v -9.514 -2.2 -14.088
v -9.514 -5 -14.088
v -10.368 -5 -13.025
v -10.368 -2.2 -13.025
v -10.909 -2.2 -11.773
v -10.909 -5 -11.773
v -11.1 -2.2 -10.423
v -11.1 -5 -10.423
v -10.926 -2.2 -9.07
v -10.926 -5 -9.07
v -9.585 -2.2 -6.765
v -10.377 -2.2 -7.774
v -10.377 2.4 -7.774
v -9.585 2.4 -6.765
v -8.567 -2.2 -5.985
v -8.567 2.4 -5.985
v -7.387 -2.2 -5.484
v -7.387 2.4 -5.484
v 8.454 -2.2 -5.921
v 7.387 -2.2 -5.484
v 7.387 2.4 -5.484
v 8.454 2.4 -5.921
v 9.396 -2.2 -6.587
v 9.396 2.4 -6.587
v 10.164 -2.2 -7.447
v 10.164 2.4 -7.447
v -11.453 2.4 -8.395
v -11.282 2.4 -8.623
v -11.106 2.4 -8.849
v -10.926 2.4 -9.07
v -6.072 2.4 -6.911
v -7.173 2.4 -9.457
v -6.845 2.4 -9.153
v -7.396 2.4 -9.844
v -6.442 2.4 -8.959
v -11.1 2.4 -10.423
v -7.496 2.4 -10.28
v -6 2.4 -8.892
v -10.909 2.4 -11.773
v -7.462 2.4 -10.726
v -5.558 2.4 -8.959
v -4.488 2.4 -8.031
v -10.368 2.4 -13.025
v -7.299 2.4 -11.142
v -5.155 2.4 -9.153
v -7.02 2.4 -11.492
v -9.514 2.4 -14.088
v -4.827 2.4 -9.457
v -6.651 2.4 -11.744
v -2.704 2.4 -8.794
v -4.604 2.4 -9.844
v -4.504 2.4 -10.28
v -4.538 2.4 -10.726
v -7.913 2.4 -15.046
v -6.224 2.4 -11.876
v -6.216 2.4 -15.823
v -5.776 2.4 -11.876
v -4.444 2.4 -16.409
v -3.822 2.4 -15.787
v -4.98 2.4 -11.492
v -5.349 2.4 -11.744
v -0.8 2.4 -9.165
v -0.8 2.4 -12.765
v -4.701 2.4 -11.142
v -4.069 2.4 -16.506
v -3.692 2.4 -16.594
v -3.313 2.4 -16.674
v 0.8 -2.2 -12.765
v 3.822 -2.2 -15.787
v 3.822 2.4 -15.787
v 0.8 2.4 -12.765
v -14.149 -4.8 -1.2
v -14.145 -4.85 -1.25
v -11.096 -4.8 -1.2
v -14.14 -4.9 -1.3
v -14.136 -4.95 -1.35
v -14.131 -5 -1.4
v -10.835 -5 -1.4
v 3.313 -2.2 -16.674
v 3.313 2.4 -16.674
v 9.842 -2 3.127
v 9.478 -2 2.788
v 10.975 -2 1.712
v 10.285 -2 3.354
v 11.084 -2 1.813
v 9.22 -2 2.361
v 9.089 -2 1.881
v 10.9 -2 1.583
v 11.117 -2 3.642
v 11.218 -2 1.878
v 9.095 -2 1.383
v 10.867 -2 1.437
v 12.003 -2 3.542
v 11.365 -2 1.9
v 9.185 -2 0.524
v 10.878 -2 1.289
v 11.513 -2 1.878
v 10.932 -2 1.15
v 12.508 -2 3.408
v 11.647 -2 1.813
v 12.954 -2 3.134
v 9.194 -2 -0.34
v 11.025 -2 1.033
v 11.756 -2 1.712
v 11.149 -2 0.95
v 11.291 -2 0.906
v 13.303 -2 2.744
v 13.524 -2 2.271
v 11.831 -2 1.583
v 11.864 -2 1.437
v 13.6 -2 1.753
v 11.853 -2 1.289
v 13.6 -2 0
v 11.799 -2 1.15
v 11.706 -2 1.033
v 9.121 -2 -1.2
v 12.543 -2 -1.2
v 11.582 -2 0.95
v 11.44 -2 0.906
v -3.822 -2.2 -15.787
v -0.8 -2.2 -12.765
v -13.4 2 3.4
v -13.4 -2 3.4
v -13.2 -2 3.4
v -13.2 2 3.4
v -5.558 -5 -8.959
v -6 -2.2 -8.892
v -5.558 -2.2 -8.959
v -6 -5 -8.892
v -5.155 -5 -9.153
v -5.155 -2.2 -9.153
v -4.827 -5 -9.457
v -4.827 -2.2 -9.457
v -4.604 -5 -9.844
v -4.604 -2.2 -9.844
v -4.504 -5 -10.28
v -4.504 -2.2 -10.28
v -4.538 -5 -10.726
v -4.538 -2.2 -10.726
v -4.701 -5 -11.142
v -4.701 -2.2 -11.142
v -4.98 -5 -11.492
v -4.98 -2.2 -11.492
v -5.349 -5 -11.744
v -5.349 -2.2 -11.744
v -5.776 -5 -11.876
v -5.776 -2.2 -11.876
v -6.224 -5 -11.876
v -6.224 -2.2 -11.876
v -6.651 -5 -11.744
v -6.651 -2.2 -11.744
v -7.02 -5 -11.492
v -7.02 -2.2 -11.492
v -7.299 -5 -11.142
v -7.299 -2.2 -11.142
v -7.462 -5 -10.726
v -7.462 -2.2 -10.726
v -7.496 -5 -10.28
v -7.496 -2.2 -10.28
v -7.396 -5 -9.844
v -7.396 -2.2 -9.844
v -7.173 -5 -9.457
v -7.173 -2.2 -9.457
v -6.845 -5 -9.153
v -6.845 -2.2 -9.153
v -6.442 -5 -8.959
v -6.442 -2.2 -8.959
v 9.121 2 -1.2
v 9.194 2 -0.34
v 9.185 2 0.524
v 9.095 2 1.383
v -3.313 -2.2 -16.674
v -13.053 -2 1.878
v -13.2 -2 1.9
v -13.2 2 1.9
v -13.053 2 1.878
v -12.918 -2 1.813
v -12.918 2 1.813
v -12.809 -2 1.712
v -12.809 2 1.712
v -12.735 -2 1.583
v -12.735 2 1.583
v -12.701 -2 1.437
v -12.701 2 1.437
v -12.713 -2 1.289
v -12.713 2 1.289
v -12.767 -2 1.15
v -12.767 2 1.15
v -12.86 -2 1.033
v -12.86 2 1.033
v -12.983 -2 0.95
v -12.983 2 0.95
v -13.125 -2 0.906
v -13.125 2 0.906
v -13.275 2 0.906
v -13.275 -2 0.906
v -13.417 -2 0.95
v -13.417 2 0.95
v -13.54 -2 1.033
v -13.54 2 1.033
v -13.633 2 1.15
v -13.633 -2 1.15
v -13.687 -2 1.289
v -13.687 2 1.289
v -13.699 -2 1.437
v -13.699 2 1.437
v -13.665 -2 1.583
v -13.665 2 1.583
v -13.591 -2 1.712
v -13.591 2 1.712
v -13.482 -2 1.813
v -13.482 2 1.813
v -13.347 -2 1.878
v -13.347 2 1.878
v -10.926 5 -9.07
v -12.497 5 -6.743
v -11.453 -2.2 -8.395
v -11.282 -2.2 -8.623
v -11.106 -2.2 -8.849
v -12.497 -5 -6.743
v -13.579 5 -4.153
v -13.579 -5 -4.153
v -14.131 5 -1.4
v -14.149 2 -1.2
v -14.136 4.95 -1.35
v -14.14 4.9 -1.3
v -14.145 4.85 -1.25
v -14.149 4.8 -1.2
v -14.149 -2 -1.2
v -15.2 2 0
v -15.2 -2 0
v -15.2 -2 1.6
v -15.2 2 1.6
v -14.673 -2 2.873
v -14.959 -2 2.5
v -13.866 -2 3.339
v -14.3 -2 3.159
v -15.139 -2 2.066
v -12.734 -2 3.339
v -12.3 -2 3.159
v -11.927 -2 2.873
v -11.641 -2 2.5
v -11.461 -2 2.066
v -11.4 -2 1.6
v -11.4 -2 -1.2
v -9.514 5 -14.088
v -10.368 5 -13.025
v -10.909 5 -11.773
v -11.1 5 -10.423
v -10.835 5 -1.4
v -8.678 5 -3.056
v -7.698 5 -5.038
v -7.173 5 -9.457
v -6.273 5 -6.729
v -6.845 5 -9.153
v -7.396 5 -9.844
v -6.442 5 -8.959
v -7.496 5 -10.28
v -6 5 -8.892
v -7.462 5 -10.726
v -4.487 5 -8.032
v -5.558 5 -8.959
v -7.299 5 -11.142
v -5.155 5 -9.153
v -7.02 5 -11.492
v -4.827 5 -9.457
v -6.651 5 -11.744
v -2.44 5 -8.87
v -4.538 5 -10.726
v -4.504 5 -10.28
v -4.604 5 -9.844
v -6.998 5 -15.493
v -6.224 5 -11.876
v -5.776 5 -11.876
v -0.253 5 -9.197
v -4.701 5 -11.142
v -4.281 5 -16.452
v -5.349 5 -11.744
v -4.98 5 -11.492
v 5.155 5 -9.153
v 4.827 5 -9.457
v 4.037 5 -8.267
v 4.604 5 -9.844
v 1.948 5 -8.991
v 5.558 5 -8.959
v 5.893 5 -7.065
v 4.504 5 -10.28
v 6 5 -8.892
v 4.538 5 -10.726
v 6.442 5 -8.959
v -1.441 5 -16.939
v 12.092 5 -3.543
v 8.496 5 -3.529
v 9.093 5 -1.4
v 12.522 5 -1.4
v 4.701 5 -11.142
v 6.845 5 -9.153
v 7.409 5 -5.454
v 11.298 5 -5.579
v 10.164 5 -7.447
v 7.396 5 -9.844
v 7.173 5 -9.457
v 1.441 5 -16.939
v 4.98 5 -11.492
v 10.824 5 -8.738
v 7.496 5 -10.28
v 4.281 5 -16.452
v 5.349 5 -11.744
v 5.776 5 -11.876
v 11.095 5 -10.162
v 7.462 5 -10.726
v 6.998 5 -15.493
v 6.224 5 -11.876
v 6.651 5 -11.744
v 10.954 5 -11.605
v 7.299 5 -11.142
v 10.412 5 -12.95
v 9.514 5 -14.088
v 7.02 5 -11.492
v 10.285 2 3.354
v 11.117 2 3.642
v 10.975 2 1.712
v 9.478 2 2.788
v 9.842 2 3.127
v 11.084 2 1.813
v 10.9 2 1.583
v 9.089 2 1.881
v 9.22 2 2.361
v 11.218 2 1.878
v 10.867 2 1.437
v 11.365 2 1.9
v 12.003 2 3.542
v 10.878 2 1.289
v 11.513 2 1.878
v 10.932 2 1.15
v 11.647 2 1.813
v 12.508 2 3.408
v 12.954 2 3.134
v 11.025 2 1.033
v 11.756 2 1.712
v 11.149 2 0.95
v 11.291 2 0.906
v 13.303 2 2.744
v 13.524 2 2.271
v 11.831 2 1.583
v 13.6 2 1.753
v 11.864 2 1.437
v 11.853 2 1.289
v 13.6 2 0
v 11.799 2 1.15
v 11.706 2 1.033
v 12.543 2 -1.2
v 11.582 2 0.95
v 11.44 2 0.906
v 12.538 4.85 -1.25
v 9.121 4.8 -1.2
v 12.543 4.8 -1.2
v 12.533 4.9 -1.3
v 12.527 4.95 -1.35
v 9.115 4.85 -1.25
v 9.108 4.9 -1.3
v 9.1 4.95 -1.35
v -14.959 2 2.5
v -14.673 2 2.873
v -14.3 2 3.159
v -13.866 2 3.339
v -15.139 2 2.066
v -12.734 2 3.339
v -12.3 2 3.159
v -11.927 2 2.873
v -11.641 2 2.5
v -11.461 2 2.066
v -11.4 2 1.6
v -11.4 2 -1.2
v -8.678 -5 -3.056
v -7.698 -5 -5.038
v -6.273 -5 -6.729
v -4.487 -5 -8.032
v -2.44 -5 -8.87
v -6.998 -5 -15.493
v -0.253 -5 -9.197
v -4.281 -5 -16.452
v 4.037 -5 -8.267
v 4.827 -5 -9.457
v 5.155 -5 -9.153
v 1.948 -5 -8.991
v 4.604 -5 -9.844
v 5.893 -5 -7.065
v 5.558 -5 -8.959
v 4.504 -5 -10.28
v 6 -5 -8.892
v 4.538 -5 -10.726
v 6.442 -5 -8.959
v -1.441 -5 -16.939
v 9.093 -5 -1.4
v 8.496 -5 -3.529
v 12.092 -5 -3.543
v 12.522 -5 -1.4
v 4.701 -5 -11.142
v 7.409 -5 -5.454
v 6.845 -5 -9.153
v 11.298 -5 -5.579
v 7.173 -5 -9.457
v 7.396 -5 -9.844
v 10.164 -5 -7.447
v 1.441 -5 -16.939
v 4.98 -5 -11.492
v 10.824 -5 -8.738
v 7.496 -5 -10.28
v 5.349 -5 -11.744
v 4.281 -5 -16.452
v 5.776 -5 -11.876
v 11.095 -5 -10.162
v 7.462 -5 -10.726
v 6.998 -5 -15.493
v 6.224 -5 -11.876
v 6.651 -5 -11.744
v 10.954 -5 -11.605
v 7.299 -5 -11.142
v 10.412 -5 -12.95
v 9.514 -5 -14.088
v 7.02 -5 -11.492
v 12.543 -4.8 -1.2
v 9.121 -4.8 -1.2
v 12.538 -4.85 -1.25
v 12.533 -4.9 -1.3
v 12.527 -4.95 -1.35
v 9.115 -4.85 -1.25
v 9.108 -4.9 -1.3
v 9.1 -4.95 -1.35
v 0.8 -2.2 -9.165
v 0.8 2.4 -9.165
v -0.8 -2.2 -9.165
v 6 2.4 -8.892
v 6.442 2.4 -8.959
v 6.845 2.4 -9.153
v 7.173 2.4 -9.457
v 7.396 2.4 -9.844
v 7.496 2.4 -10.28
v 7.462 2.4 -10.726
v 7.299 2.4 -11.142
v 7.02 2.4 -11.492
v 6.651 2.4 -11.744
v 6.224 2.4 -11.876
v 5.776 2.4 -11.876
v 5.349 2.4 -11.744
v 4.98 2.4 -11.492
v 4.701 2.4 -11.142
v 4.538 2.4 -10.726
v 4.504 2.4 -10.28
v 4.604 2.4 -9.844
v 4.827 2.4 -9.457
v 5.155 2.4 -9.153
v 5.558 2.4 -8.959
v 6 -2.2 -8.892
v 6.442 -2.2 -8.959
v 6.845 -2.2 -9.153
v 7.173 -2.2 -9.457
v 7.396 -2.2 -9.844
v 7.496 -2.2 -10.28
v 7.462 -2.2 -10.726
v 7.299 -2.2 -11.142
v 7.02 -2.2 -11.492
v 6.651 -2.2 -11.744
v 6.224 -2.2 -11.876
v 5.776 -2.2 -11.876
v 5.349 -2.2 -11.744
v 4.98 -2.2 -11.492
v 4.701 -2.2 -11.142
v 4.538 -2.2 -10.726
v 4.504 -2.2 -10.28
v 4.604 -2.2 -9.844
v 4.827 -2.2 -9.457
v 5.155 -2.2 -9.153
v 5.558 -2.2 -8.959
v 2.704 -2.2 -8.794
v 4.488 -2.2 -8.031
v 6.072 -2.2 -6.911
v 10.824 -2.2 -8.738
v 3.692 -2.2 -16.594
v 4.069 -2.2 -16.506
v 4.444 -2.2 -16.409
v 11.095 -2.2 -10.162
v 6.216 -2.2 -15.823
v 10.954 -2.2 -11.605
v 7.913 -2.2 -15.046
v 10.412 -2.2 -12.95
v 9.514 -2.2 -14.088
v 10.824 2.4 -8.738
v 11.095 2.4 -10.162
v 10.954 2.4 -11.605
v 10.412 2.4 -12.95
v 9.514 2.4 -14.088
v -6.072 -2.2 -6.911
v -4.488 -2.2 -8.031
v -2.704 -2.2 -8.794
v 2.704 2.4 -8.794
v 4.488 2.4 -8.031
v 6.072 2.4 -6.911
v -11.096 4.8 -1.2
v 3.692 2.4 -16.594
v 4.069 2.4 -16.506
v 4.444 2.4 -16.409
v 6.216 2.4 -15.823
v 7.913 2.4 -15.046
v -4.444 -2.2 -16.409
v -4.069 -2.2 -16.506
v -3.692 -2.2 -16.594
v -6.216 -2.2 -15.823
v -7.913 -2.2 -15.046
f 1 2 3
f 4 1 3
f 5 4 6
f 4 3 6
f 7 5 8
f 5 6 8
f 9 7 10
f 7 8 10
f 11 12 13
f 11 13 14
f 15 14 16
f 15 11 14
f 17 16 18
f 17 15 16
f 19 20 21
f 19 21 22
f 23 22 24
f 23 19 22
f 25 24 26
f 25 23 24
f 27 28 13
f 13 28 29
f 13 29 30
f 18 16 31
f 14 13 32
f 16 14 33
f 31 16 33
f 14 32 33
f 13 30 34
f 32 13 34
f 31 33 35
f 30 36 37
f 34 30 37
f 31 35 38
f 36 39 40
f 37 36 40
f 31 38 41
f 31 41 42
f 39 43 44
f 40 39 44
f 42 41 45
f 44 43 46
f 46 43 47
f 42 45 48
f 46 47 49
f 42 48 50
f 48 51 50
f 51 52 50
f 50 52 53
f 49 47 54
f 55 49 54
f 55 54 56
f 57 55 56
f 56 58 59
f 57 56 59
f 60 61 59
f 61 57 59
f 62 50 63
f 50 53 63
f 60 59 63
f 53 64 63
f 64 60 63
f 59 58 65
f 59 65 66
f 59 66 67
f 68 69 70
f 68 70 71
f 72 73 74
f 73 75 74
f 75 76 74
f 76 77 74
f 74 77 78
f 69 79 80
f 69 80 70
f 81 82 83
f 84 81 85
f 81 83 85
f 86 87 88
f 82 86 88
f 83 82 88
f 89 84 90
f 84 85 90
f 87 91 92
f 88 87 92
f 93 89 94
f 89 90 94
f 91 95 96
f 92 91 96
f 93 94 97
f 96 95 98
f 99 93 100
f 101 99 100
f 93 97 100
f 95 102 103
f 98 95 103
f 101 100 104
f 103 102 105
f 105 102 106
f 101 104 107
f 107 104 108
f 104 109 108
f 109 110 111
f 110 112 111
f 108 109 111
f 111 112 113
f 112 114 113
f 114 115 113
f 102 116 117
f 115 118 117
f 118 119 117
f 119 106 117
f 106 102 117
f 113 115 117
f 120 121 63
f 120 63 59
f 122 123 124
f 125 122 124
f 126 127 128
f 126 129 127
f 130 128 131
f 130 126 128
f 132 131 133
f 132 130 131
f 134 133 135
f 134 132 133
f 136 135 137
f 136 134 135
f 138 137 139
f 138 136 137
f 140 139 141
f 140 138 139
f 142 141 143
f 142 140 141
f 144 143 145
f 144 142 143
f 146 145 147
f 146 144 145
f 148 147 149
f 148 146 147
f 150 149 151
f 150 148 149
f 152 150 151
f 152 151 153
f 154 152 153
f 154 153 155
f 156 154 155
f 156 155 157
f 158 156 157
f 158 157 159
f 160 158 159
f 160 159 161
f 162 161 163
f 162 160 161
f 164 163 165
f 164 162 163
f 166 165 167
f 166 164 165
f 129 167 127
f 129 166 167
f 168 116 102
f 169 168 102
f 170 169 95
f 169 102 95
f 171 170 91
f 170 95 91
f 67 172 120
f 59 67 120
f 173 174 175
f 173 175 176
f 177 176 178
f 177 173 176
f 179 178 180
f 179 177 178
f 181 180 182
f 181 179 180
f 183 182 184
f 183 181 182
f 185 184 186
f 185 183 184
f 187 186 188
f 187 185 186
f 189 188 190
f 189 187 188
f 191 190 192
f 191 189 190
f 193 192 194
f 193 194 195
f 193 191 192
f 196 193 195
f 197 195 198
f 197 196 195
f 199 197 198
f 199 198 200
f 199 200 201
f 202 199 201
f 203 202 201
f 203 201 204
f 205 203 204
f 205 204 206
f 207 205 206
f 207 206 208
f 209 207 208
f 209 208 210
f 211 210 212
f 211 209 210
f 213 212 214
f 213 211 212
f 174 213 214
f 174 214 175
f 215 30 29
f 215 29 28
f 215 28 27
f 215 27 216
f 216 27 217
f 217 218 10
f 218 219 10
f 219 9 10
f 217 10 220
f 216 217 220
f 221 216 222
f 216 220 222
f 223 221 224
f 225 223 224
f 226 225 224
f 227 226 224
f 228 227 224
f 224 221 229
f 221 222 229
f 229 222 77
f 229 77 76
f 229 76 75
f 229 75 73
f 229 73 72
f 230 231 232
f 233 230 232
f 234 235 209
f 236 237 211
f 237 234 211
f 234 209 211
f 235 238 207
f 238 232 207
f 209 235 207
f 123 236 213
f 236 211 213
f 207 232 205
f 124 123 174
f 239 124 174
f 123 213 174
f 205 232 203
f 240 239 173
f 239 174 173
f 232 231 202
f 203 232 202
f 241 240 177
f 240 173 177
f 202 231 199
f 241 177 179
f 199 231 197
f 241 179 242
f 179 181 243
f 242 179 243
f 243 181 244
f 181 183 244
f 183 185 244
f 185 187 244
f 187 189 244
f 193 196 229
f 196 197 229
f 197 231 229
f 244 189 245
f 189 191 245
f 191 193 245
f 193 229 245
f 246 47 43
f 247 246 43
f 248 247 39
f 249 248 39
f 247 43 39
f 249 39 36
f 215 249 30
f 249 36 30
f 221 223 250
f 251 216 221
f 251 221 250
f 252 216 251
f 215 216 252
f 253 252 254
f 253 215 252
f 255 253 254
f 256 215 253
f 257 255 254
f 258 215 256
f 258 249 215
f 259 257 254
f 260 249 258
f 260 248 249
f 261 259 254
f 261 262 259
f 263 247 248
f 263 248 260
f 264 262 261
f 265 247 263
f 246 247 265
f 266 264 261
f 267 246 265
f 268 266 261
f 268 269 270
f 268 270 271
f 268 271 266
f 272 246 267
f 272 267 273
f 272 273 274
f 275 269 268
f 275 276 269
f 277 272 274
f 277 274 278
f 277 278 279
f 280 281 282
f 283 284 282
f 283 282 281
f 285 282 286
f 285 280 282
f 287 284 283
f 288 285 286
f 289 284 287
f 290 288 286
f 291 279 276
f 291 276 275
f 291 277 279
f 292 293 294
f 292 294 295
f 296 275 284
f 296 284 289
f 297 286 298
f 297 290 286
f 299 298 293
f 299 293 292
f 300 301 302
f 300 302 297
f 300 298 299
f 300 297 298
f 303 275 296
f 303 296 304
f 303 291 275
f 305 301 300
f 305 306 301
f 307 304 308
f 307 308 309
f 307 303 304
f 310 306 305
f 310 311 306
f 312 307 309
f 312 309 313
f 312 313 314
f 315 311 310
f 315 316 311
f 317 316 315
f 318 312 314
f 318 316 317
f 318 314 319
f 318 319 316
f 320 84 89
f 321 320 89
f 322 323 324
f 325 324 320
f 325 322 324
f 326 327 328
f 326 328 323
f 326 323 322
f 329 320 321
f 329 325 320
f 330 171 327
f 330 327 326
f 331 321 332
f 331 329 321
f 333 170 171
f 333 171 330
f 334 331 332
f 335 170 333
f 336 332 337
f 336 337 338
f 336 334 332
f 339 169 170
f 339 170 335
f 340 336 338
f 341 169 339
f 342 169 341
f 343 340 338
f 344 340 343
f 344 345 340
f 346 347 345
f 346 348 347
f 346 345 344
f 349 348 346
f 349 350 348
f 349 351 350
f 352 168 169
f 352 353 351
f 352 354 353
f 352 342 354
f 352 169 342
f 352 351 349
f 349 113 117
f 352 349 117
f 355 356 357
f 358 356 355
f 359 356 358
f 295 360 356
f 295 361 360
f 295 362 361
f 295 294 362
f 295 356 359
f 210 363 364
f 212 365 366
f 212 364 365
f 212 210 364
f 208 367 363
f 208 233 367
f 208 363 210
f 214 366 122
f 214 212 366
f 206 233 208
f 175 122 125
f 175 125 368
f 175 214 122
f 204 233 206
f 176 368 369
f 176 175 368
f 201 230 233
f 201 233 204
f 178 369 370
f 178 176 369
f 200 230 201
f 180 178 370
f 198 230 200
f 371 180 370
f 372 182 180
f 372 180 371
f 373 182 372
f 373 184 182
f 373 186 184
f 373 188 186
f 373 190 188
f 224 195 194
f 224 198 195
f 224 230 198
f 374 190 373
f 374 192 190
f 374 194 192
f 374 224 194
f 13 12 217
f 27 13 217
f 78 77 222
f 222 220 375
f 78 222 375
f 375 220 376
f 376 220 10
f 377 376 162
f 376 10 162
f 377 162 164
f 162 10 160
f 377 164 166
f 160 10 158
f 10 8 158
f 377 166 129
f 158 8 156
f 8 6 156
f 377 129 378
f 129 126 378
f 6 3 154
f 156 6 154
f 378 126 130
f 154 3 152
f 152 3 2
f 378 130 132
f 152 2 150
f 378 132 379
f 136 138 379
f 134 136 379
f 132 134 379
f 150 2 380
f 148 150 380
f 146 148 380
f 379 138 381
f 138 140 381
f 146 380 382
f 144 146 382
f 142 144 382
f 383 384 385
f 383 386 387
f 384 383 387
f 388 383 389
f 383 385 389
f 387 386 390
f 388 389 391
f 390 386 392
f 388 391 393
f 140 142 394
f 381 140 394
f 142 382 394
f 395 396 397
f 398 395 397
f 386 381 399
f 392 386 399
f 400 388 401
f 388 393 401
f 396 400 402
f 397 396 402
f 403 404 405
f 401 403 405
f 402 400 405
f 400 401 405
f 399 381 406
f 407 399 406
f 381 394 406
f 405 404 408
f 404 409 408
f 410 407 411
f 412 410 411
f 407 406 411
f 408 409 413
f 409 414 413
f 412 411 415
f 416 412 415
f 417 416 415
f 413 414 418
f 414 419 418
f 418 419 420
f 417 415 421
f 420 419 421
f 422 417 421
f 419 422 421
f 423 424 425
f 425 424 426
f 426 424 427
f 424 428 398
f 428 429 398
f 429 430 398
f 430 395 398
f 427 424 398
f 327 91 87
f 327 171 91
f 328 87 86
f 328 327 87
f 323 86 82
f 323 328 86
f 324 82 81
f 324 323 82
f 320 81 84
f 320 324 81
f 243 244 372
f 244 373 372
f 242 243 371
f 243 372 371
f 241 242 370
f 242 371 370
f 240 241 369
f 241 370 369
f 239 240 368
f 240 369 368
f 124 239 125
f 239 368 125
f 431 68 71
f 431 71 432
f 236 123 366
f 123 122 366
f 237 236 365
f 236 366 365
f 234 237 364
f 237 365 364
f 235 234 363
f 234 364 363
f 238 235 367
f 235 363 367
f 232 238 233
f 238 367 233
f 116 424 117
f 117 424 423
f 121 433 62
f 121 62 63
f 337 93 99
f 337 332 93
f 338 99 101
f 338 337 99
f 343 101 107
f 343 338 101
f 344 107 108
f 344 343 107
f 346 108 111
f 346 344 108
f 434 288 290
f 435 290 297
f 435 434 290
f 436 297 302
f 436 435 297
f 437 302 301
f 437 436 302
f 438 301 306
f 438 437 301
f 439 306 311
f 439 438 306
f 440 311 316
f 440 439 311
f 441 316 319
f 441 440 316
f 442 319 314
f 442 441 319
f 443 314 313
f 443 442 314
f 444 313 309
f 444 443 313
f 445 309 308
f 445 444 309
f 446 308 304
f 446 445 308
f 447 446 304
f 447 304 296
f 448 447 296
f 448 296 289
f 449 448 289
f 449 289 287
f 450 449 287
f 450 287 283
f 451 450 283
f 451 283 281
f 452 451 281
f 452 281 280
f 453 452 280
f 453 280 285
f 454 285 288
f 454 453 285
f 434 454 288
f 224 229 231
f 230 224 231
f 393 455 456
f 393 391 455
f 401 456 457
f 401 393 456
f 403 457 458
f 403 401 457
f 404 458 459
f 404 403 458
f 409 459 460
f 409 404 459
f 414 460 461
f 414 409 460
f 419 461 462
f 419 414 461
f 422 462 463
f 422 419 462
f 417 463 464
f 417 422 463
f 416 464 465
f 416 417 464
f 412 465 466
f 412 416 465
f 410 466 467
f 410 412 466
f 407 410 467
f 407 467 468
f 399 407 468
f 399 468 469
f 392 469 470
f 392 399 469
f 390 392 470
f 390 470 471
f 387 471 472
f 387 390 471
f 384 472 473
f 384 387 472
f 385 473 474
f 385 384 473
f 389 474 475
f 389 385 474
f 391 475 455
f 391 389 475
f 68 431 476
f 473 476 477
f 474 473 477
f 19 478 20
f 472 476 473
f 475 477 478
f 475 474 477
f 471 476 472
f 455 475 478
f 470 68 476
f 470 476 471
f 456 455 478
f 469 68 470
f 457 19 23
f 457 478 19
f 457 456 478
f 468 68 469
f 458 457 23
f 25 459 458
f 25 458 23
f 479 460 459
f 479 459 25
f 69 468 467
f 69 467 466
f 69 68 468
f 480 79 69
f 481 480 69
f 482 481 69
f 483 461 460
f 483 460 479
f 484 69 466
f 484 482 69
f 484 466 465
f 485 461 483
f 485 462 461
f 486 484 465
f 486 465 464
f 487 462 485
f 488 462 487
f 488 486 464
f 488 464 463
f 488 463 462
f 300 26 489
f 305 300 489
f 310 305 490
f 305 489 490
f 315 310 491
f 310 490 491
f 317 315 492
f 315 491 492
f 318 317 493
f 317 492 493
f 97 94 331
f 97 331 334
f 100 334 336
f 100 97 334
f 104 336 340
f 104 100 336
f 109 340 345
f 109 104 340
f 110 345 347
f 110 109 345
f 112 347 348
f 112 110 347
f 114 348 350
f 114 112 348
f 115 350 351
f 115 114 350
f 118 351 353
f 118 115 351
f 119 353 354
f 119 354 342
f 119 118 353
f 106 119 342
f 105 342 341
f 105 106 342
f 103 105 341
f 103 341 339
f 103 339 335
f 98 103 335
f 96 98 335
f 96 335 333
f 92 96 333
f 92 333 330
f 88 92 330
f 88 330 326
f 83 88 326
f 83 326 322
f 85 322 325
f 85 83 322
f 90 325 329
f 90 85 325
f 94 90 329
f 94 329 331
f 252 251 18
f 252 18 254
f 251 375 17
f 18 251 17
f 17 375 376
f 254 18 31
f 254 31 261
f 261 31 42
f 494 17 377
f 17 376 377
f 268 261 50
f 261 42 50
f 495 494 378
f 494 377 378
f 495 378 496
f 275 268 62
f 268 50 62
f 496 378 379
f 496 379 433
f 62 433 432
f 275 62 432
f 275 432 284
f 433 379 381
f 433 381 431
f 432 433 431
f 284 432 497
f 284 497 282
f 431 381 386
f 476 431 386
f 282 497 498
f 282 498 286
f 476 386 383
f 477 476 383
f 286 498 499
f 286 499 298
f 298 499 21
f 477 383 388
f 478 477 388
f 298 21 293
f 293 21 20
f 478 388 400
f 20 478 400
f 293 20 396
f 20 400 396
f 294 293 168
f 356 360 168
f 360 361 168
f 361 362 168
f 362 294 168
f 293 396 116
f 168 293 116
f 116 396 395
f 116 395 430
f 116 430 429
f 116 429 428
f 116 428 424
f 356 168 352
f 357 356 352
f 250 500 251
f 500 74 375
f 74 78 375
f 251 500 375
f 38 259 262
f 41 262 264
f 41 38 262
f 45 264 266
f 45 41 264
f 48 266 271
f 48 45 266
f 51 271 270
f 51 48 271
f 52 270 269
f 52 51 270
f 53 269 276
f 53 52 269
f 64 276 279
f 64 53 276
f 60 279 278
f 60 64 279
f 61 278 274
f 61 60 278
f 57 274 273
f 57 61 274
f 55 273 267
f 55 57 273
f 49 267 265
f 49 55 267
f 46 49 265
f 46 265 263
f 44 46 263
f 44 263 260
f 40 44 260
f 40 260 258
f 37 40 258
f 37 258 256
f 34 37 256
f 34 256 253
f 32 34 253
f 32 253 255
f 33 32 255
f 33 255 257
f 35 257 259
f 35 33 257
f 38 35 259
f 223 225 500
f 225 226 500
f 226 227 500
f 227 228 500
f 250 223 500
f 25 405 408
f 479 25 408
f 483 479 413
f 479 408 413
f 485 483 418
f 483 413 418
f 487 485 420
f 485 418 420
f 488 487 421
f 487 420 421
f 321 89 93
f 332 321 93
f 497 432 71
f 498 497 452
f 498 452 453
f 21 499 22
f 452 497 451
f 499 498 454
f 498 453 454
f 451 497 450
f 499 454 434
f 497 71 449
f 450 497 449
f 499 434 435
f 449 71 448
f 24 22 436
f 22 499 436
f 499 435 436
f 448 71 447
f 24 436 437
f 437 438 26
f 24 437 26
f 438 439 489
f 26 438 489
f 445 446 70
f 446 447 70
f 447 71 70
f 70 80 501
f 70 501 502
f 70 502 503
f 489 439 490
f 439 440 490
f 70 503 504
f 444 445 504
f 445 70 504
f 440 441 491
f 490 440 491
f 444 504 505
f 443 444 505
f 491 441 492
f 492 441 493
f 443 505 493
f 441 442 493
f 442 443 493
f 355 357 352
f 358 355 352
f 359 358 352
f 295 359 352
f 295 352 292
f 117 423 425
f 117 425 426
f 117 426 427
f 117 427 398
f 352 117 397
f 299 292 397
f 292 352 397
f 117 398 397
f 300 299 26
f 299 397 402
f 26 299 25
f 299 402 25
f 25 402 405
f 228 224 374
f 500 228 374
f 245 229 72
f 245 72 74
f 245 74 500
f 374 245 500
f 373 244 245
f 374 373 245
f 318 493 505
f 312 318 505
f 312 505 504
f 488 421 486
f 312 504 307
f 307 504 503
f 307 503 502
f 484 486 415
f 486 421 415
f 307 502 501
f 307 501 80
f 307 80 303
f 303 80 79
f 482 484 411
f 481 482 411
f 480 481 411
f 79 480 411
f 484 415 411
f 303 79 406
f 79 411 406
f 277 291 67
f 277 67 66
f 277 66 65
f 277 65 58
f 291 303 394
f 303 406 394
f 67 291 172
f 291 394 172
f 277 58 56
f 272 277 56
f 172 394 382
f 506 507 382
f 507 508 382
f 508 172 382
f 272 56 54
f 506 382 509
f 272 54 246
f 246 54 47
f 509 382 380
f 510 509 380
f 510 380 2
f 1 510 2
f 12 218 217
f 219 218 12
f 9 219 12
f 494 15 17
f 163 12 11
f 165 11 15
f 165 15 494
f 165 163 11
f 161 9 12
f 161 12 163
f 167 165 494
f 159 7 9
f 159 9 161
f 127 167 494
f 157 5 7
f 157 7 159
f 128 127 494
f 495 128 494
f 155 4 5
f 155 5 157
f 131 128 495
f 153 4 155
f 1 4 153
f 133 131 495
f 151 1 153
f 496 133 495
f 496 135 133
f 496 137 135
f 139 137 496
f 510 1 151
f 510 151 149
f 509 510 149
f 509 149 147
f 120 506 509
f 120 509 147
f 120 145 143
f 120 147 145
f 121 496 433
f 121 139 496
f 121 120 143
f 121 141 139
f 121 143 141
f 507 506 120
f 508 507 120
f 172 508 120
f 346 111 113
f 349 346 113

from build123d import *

# Parameters (mm, degrees)
BOSS_EXTRUDE1_DEPTH      = 5
BOSS_EXTRUDE1_DEPTH_BACK = 5
BOSS_EXTRUDE2_DEPTH      = 2
BOSS_EXTRUDE2_DEPTH_BACK = 2
SKETCH1_3_R              = 0.5
CHAMFER1_SIZE            = 1.974397617
FILLET1_R                = 1.8
CHAMFER2_SIZE            = 0.2
BOSS_EXTRUDE3_START      = -5
BOSS_EXTRUDE3_DEPTH      = 10
CUT_EXTRUDE1_START       = -2.2
CUT_EXTRUDE1_OUTLINE_R   = 1.5
CUT_EXTRUDE1_DEPTH       = 4.6
CUT_EXTRUDE2_DEPTH       = 24.34609175
CUT_EXTRUDE2_DEPTH_BACK  = 24.34609175
SKETCH3_4_R              = 1.5
CHAMFER3_SIZE            = 0.2
CHAMFER4_SIZE            = 0.879093368


with BuildPart() as part:
    # Sketch1 → Boss-Extrude1 (new, two sides: drawn at the far end of the back side and taken through both)
    with BuildSketch(Plane(origin=(0, 0, 0), x_dir=(1, 0, 0), z_dir=(0, 1, 0)).offset(-BOSS_EXTRUDE1_DEPTH_BACK)):
        with BuildLine():
            ThreePointArc((-9.121403401, 1.2), (0, 9.2), (9.121403401, 1.2))
            Line((9.121403401, 1.2), (12.542726976, 1.2))
            ThreePointArc((12.542726976, 1.2), (11.397774814, 5.371287488), (8.909545443, 8.909545443))
            Line((8.909545443, 8.909545443), (7.963837169, 11.756585285))
            ThreePointArc((7.963837169, 11.756585285), (-6.117603026, 12.814637459), (-14.149204925, 1.2))
            Line((-14.149204925, 1.2), (-9.121403401, 1.2))
        make_face()
    extrude(amount=BOSS_EXTRUDE1_DEPTH + BOSS_EXTRUDE1_DEPTH_BACK)

    # Sketch1<3> → Boss-Extrude2 (add, two sides: drawn at the far end of the back side and taken through both)
    # profile 1 of 2: a face of its own
    with BuildSketch(Plane(origin=(0, 0, 0), x_dir=(1, 0, 0), z_dir=(0, 1, 0)).offset(-BOSS_EXTRUDE2_DEPTH_BACK)):
        Polygon((-11.4, -3.4), (-11.4, 1.2), (-14.149204925, 1.2), (-15.2, 0), (-15.2, -3.4), align=None)
        with Locations(Location((-13.2, -1.4, 0), (0, 0, 270))):
            Circle(SKETCH1_3_R, mode=Mode.SUBTRACT)
    # profile 2 of 2: a face of its own
    with BuildSketch(Plane(origin=(0, 0, 0), x_dir=(1, 0, 0), z_dir=(0, 1, 0)).offset(-BOSS_EXTRUDE2_DEPTH_BACK)):
        with BuildLine():
            ThreePointArc((9.121403401, 1.2), (9.162283589, -0.832201557), (8.755927173, -2.823781036))
            Line((8.755927173, -2.823781036), (11.11699974, -3.64230517))
            Line((11.11699974, -3.64230517), (13.6, -3.360604742))
            Line((13.6, -3.360604742), (13.6, 0))
            Line((13.6, 0), (12.542726976, 1.2))
            Line((12.542726976, 1.2), (9.121403401, 1.2))
        make_face()
        with Locations(Location((11.365493645, -1.4, 0), (0, 0, 270))):
            Circle(SKETCH1_3_R, mode=Mode.SUBTRACT)
    extrude(amount=BOSS_EXTRUDE2_DEPTH + BOSS_EXTRUDE2_DEPTH_BACK)

    # Chamfer1
    # the kernel refuses this chamfer: 1.974397617, 1.7 mm, written as the material it takes off along each edge
    with BuildSketch(Plane(origin=(-9.121403401, -10.094040977, -1.2), x_dir=(-1, 0, 0), z_dir=(0, 1, 0))) as chamfer1_piece_1:
        with BuildLine():
            Line((CHAMFER1_SIZE, 0), (-0.443747976, -1.855862617))
            ThreePointArc((-0.443747976, -1.855862617), (-0.180868647, -0.969524905), (0, 0))
            Line((0, 0), (CHAMFER1_SIZE, 0))
        make_face()
    extrude(amount=20.188081954, mode=Mode.SUBTRACT)

    # Fillet1
    fillet1_edges = [part.edges().sort_by_distance(p)[0] for p in [
        (8.755927173, 0, 2.823781036),
        (13.6, 0, 3.360604742),
        (-15.2, 0, 3.4),
        (-11.4, 0, 3.4),
    ]]
    fillet(fillet1_edges, radius=FILLET1_R)

    # Chamfer2
    chamfer2_edges = [part.edges().sort_by_distance(p)[0] for p in [
        (10.832065189, 5, -1.2),
        (-12.622502971, 5, -1.2),
    ]]
    chamfer(chamfer2_edges, length=CHAMFER2_SIZE)

    # Boss-Extrude3: read off the stored shape, not the designer's step
    # Boss-Extrude3 outline → Boss-Extrude3 (add)
    with BuildSketch(Plane(origin=(0, 0, 0), x_dir=(1, 0, 0), z_dir=(0, 1, 0)).offset(BOSS_EXTRUDE3_START)):
        with BuildLine():
            ThreePointArc((10.163659229, 7.447149191), (11.075788932, 10.888658263), (9.514234502, 14.088269654))
            ThreePointArc((9.514234502, 14.088269654), (0, 17), (-9.514234502, 14.088269654))
            ThreePointArc((-9.514234502, 14.088269654), (-10.909488785, 11.773217539), (-10.925669215, 9.070267483))
            ThreePointArc((-10.925669215, 9.070267483), (-1.999296901, 14.058549424), (7.963837169, 11.756585285))
            Line((7.963837169, 11.756585285), (8.909545443, 8.909545443))
            ThreePointArc((8.909545443, 8.909545443), (9.564592768, 8.202351199), (10.163659229, 7.447149191))
        make_face()
    extrude(amount=BOSS_EXTRUDE3_DEPTH)

    # Cut-Extrude1: read off the stored shape, not the designer's step
    # Cut-Extrude1 outline → Cut-Extrude1 (cut)
    # profile 1 of 2: a face of its own
    with BuildSketch(Plane(origin=(0, 0, 0), x_dir=(1, 0, 0), z_dir=(0, 1, 0)).offset(CUT_EXTRUDE1_START)):
        with BuildLine():
            ThreePointArc((-10.925669215, 9.070267483), (-9.629828713, 6.809799644), (-7.386560009, 5.484408011))
            ThreePointArc((-7.386560009, 5.484408011), (-4.487973836, 8.031070342), (-0.8, 9.16515139))
            Line((-0.8, 9.16515139), (-0.8, 12.76515139))
            Line((-0.8, 12.76515139), (-4.443774964, 16.408926353))
            ThreePointArc((-4.443774964, 16.408926353), (-7.074805223, 15.457914835), (-9.514234502, 14.088269654))
            ThreePointArc((-9.514234502, 14.088269654), (-10.909488785, 11.773217539), (-10.925669215, 9.070267483))
        make_face()
        with Locations((-6, 10.392304845)):
            Circle(CUT_EXTRUDE1_OUTLINE_R, mode=Mode.SUBTRACT)
    # profile 2 of 2: a face of its own
    with BuildSketch(Plane(origin=(0, 0, 0), x_dir=(1, 0, 0), z_dir=(0, 1, 0)).offset(CUT_EXTRUDE1_START)):
        with BuildLine():
            Line((0.8, 12.76515139), (0.8, 9.16515139))
            ThreePointArc((0.8, 9.16515139), (4.487973836, 8.031070342), (7.386560009, 5.484408011))
            ThreePointArc((7.386560009, 5.484408011), (8.943521978, 6.22749052), (10.163659229, 7.447149191))
            ThreePointArc((10.163659229, 7.447149191), (11.075788932, 10.888658263), (9.514234502, 14.088269654))
            ThreePointArc((9.514234502, 14.088269654), (7.074805223, 15.457914835), (4.443774964, 16.408926353))
            Line((4.443774964, 16.408926353), (0.8, 12.76515139))
        make_face()
        with Locations((6, 10.392304845)):
            Circle(CUT_EXTRUDE1_OUTLINE_R, mode=Mode.SUBTRACT)
    extrude(amount=CUT_EXTRUDE1_DEPTH, mode=Mode.SUBTRACT)

    # Sketch3<4> (on Top Plane) → Cut-Extrude2 (cut, two sides: drawn at the far end of the back side and taken through both)
    with BuildSketch(Plane(origin=(0, 0, 0), x_dir=(1, 0, 0), z_dir=(0, 1, 0)).offset(-CUT_EXTRUDE2_DEPTH_BACK)):
        with Locations(Location((-6, 10.392304845, 0), (0, 0, 270))):
            Circle(SKETCH3_4_R)
        with Locations(Location((6, 10.392304845, 0), (0, 0, 270))):
            Circle(SKETCH3_4_R)
    extrude(amount=CUT_EXTRUDE2_DEPTH + CUT_EXTRUDE2_DEPTH_BACK, mode=Mode.SUBTRACT)

    # Chamfer3
    chamfer3_edges = [part.edges().sort_by_distance(p)[0] for p in [
        (10.832065189, -5, -1.2),
        (-12.622502971, -5, -1.2),
    ]]
    chamfer(chamfer3_edges, length=CHAMFER3_SIZE)

    # Chamfer4
    # the kernel refuses this chamfer: 1.2, 0.879093368, 0.860893535 mm, written as the material it takes off along each edge
    with BuildSketch(Plane(origin=(-10.925669215, -2.2, -9.070267483), x_dir=(0.39004090041873263, 0, 0.9207975325773544), z_dir=(0, 1, 0))) as chamfer4_piece_1:
        with BuildLine():
            Line((1.40776743, 0), (0.416367157, -0.748890719))
            ThreePointArc((0.416367157, -0.748890719), (0.204153797, -0.380499927), (0, 0))
            ThreePointArc((0, 0), (0.723274519, -0.048770435), (1.40776743, 0))
        make_face()
    extrude(amount=4.6, mode=Mode.SUBTRACT)
    with BuildSketch(Plane(origin=(4.443774964, -2.2, -16.408926353), x_dir=(-0.9735942522545705, 0, -0.22828541779286665), z_dir=(0, 1, 0))) as chamfer4_piece_2:
        with BuildLine():
            Line((1.16103032, 0), (CHAMFER4_SIZE * 0.527012931132, CHAMFER4_SIZE * 0.849857264932))
            Line((CHAMFER4_SIZE * 0.527012931132, CHAMFER4_SIZE * 0.849857264932), (0, 0))
            ThreePointArc((0, 0), (0.596888963, -0.009906707), (1.16103032, 0))
        make_face()
    extrude(amount=4.6, mode=Mode.SUBTRACT)
    with BuildSketch(Plane(origin=(-4.443774964, -2.2, -16.408926353), x_dir=(0.9735942522545713, 0, -0.22828541779286343), z_dir=(0, 1, 0))) as chamfer4_piece_3:
        with BuildLine():
            Line((1.16103032, 0), (CHAMFER4_SIZE * 0.527012931132, -CHAMFER4_SIZE * 0.849857264932))
            Line((CHAMFER4_SIZE * 0.527012931132, -CHAMFER4_SIZE * 0.849857264932), (0, 0))
            ThreePointArc((0, 0), (0.596888963, 0.009906707), (1.16103032, 0))
        make_face()
    extrude(amount=4.6, mode=Mode.SUBTRACT)


solid = part.part
